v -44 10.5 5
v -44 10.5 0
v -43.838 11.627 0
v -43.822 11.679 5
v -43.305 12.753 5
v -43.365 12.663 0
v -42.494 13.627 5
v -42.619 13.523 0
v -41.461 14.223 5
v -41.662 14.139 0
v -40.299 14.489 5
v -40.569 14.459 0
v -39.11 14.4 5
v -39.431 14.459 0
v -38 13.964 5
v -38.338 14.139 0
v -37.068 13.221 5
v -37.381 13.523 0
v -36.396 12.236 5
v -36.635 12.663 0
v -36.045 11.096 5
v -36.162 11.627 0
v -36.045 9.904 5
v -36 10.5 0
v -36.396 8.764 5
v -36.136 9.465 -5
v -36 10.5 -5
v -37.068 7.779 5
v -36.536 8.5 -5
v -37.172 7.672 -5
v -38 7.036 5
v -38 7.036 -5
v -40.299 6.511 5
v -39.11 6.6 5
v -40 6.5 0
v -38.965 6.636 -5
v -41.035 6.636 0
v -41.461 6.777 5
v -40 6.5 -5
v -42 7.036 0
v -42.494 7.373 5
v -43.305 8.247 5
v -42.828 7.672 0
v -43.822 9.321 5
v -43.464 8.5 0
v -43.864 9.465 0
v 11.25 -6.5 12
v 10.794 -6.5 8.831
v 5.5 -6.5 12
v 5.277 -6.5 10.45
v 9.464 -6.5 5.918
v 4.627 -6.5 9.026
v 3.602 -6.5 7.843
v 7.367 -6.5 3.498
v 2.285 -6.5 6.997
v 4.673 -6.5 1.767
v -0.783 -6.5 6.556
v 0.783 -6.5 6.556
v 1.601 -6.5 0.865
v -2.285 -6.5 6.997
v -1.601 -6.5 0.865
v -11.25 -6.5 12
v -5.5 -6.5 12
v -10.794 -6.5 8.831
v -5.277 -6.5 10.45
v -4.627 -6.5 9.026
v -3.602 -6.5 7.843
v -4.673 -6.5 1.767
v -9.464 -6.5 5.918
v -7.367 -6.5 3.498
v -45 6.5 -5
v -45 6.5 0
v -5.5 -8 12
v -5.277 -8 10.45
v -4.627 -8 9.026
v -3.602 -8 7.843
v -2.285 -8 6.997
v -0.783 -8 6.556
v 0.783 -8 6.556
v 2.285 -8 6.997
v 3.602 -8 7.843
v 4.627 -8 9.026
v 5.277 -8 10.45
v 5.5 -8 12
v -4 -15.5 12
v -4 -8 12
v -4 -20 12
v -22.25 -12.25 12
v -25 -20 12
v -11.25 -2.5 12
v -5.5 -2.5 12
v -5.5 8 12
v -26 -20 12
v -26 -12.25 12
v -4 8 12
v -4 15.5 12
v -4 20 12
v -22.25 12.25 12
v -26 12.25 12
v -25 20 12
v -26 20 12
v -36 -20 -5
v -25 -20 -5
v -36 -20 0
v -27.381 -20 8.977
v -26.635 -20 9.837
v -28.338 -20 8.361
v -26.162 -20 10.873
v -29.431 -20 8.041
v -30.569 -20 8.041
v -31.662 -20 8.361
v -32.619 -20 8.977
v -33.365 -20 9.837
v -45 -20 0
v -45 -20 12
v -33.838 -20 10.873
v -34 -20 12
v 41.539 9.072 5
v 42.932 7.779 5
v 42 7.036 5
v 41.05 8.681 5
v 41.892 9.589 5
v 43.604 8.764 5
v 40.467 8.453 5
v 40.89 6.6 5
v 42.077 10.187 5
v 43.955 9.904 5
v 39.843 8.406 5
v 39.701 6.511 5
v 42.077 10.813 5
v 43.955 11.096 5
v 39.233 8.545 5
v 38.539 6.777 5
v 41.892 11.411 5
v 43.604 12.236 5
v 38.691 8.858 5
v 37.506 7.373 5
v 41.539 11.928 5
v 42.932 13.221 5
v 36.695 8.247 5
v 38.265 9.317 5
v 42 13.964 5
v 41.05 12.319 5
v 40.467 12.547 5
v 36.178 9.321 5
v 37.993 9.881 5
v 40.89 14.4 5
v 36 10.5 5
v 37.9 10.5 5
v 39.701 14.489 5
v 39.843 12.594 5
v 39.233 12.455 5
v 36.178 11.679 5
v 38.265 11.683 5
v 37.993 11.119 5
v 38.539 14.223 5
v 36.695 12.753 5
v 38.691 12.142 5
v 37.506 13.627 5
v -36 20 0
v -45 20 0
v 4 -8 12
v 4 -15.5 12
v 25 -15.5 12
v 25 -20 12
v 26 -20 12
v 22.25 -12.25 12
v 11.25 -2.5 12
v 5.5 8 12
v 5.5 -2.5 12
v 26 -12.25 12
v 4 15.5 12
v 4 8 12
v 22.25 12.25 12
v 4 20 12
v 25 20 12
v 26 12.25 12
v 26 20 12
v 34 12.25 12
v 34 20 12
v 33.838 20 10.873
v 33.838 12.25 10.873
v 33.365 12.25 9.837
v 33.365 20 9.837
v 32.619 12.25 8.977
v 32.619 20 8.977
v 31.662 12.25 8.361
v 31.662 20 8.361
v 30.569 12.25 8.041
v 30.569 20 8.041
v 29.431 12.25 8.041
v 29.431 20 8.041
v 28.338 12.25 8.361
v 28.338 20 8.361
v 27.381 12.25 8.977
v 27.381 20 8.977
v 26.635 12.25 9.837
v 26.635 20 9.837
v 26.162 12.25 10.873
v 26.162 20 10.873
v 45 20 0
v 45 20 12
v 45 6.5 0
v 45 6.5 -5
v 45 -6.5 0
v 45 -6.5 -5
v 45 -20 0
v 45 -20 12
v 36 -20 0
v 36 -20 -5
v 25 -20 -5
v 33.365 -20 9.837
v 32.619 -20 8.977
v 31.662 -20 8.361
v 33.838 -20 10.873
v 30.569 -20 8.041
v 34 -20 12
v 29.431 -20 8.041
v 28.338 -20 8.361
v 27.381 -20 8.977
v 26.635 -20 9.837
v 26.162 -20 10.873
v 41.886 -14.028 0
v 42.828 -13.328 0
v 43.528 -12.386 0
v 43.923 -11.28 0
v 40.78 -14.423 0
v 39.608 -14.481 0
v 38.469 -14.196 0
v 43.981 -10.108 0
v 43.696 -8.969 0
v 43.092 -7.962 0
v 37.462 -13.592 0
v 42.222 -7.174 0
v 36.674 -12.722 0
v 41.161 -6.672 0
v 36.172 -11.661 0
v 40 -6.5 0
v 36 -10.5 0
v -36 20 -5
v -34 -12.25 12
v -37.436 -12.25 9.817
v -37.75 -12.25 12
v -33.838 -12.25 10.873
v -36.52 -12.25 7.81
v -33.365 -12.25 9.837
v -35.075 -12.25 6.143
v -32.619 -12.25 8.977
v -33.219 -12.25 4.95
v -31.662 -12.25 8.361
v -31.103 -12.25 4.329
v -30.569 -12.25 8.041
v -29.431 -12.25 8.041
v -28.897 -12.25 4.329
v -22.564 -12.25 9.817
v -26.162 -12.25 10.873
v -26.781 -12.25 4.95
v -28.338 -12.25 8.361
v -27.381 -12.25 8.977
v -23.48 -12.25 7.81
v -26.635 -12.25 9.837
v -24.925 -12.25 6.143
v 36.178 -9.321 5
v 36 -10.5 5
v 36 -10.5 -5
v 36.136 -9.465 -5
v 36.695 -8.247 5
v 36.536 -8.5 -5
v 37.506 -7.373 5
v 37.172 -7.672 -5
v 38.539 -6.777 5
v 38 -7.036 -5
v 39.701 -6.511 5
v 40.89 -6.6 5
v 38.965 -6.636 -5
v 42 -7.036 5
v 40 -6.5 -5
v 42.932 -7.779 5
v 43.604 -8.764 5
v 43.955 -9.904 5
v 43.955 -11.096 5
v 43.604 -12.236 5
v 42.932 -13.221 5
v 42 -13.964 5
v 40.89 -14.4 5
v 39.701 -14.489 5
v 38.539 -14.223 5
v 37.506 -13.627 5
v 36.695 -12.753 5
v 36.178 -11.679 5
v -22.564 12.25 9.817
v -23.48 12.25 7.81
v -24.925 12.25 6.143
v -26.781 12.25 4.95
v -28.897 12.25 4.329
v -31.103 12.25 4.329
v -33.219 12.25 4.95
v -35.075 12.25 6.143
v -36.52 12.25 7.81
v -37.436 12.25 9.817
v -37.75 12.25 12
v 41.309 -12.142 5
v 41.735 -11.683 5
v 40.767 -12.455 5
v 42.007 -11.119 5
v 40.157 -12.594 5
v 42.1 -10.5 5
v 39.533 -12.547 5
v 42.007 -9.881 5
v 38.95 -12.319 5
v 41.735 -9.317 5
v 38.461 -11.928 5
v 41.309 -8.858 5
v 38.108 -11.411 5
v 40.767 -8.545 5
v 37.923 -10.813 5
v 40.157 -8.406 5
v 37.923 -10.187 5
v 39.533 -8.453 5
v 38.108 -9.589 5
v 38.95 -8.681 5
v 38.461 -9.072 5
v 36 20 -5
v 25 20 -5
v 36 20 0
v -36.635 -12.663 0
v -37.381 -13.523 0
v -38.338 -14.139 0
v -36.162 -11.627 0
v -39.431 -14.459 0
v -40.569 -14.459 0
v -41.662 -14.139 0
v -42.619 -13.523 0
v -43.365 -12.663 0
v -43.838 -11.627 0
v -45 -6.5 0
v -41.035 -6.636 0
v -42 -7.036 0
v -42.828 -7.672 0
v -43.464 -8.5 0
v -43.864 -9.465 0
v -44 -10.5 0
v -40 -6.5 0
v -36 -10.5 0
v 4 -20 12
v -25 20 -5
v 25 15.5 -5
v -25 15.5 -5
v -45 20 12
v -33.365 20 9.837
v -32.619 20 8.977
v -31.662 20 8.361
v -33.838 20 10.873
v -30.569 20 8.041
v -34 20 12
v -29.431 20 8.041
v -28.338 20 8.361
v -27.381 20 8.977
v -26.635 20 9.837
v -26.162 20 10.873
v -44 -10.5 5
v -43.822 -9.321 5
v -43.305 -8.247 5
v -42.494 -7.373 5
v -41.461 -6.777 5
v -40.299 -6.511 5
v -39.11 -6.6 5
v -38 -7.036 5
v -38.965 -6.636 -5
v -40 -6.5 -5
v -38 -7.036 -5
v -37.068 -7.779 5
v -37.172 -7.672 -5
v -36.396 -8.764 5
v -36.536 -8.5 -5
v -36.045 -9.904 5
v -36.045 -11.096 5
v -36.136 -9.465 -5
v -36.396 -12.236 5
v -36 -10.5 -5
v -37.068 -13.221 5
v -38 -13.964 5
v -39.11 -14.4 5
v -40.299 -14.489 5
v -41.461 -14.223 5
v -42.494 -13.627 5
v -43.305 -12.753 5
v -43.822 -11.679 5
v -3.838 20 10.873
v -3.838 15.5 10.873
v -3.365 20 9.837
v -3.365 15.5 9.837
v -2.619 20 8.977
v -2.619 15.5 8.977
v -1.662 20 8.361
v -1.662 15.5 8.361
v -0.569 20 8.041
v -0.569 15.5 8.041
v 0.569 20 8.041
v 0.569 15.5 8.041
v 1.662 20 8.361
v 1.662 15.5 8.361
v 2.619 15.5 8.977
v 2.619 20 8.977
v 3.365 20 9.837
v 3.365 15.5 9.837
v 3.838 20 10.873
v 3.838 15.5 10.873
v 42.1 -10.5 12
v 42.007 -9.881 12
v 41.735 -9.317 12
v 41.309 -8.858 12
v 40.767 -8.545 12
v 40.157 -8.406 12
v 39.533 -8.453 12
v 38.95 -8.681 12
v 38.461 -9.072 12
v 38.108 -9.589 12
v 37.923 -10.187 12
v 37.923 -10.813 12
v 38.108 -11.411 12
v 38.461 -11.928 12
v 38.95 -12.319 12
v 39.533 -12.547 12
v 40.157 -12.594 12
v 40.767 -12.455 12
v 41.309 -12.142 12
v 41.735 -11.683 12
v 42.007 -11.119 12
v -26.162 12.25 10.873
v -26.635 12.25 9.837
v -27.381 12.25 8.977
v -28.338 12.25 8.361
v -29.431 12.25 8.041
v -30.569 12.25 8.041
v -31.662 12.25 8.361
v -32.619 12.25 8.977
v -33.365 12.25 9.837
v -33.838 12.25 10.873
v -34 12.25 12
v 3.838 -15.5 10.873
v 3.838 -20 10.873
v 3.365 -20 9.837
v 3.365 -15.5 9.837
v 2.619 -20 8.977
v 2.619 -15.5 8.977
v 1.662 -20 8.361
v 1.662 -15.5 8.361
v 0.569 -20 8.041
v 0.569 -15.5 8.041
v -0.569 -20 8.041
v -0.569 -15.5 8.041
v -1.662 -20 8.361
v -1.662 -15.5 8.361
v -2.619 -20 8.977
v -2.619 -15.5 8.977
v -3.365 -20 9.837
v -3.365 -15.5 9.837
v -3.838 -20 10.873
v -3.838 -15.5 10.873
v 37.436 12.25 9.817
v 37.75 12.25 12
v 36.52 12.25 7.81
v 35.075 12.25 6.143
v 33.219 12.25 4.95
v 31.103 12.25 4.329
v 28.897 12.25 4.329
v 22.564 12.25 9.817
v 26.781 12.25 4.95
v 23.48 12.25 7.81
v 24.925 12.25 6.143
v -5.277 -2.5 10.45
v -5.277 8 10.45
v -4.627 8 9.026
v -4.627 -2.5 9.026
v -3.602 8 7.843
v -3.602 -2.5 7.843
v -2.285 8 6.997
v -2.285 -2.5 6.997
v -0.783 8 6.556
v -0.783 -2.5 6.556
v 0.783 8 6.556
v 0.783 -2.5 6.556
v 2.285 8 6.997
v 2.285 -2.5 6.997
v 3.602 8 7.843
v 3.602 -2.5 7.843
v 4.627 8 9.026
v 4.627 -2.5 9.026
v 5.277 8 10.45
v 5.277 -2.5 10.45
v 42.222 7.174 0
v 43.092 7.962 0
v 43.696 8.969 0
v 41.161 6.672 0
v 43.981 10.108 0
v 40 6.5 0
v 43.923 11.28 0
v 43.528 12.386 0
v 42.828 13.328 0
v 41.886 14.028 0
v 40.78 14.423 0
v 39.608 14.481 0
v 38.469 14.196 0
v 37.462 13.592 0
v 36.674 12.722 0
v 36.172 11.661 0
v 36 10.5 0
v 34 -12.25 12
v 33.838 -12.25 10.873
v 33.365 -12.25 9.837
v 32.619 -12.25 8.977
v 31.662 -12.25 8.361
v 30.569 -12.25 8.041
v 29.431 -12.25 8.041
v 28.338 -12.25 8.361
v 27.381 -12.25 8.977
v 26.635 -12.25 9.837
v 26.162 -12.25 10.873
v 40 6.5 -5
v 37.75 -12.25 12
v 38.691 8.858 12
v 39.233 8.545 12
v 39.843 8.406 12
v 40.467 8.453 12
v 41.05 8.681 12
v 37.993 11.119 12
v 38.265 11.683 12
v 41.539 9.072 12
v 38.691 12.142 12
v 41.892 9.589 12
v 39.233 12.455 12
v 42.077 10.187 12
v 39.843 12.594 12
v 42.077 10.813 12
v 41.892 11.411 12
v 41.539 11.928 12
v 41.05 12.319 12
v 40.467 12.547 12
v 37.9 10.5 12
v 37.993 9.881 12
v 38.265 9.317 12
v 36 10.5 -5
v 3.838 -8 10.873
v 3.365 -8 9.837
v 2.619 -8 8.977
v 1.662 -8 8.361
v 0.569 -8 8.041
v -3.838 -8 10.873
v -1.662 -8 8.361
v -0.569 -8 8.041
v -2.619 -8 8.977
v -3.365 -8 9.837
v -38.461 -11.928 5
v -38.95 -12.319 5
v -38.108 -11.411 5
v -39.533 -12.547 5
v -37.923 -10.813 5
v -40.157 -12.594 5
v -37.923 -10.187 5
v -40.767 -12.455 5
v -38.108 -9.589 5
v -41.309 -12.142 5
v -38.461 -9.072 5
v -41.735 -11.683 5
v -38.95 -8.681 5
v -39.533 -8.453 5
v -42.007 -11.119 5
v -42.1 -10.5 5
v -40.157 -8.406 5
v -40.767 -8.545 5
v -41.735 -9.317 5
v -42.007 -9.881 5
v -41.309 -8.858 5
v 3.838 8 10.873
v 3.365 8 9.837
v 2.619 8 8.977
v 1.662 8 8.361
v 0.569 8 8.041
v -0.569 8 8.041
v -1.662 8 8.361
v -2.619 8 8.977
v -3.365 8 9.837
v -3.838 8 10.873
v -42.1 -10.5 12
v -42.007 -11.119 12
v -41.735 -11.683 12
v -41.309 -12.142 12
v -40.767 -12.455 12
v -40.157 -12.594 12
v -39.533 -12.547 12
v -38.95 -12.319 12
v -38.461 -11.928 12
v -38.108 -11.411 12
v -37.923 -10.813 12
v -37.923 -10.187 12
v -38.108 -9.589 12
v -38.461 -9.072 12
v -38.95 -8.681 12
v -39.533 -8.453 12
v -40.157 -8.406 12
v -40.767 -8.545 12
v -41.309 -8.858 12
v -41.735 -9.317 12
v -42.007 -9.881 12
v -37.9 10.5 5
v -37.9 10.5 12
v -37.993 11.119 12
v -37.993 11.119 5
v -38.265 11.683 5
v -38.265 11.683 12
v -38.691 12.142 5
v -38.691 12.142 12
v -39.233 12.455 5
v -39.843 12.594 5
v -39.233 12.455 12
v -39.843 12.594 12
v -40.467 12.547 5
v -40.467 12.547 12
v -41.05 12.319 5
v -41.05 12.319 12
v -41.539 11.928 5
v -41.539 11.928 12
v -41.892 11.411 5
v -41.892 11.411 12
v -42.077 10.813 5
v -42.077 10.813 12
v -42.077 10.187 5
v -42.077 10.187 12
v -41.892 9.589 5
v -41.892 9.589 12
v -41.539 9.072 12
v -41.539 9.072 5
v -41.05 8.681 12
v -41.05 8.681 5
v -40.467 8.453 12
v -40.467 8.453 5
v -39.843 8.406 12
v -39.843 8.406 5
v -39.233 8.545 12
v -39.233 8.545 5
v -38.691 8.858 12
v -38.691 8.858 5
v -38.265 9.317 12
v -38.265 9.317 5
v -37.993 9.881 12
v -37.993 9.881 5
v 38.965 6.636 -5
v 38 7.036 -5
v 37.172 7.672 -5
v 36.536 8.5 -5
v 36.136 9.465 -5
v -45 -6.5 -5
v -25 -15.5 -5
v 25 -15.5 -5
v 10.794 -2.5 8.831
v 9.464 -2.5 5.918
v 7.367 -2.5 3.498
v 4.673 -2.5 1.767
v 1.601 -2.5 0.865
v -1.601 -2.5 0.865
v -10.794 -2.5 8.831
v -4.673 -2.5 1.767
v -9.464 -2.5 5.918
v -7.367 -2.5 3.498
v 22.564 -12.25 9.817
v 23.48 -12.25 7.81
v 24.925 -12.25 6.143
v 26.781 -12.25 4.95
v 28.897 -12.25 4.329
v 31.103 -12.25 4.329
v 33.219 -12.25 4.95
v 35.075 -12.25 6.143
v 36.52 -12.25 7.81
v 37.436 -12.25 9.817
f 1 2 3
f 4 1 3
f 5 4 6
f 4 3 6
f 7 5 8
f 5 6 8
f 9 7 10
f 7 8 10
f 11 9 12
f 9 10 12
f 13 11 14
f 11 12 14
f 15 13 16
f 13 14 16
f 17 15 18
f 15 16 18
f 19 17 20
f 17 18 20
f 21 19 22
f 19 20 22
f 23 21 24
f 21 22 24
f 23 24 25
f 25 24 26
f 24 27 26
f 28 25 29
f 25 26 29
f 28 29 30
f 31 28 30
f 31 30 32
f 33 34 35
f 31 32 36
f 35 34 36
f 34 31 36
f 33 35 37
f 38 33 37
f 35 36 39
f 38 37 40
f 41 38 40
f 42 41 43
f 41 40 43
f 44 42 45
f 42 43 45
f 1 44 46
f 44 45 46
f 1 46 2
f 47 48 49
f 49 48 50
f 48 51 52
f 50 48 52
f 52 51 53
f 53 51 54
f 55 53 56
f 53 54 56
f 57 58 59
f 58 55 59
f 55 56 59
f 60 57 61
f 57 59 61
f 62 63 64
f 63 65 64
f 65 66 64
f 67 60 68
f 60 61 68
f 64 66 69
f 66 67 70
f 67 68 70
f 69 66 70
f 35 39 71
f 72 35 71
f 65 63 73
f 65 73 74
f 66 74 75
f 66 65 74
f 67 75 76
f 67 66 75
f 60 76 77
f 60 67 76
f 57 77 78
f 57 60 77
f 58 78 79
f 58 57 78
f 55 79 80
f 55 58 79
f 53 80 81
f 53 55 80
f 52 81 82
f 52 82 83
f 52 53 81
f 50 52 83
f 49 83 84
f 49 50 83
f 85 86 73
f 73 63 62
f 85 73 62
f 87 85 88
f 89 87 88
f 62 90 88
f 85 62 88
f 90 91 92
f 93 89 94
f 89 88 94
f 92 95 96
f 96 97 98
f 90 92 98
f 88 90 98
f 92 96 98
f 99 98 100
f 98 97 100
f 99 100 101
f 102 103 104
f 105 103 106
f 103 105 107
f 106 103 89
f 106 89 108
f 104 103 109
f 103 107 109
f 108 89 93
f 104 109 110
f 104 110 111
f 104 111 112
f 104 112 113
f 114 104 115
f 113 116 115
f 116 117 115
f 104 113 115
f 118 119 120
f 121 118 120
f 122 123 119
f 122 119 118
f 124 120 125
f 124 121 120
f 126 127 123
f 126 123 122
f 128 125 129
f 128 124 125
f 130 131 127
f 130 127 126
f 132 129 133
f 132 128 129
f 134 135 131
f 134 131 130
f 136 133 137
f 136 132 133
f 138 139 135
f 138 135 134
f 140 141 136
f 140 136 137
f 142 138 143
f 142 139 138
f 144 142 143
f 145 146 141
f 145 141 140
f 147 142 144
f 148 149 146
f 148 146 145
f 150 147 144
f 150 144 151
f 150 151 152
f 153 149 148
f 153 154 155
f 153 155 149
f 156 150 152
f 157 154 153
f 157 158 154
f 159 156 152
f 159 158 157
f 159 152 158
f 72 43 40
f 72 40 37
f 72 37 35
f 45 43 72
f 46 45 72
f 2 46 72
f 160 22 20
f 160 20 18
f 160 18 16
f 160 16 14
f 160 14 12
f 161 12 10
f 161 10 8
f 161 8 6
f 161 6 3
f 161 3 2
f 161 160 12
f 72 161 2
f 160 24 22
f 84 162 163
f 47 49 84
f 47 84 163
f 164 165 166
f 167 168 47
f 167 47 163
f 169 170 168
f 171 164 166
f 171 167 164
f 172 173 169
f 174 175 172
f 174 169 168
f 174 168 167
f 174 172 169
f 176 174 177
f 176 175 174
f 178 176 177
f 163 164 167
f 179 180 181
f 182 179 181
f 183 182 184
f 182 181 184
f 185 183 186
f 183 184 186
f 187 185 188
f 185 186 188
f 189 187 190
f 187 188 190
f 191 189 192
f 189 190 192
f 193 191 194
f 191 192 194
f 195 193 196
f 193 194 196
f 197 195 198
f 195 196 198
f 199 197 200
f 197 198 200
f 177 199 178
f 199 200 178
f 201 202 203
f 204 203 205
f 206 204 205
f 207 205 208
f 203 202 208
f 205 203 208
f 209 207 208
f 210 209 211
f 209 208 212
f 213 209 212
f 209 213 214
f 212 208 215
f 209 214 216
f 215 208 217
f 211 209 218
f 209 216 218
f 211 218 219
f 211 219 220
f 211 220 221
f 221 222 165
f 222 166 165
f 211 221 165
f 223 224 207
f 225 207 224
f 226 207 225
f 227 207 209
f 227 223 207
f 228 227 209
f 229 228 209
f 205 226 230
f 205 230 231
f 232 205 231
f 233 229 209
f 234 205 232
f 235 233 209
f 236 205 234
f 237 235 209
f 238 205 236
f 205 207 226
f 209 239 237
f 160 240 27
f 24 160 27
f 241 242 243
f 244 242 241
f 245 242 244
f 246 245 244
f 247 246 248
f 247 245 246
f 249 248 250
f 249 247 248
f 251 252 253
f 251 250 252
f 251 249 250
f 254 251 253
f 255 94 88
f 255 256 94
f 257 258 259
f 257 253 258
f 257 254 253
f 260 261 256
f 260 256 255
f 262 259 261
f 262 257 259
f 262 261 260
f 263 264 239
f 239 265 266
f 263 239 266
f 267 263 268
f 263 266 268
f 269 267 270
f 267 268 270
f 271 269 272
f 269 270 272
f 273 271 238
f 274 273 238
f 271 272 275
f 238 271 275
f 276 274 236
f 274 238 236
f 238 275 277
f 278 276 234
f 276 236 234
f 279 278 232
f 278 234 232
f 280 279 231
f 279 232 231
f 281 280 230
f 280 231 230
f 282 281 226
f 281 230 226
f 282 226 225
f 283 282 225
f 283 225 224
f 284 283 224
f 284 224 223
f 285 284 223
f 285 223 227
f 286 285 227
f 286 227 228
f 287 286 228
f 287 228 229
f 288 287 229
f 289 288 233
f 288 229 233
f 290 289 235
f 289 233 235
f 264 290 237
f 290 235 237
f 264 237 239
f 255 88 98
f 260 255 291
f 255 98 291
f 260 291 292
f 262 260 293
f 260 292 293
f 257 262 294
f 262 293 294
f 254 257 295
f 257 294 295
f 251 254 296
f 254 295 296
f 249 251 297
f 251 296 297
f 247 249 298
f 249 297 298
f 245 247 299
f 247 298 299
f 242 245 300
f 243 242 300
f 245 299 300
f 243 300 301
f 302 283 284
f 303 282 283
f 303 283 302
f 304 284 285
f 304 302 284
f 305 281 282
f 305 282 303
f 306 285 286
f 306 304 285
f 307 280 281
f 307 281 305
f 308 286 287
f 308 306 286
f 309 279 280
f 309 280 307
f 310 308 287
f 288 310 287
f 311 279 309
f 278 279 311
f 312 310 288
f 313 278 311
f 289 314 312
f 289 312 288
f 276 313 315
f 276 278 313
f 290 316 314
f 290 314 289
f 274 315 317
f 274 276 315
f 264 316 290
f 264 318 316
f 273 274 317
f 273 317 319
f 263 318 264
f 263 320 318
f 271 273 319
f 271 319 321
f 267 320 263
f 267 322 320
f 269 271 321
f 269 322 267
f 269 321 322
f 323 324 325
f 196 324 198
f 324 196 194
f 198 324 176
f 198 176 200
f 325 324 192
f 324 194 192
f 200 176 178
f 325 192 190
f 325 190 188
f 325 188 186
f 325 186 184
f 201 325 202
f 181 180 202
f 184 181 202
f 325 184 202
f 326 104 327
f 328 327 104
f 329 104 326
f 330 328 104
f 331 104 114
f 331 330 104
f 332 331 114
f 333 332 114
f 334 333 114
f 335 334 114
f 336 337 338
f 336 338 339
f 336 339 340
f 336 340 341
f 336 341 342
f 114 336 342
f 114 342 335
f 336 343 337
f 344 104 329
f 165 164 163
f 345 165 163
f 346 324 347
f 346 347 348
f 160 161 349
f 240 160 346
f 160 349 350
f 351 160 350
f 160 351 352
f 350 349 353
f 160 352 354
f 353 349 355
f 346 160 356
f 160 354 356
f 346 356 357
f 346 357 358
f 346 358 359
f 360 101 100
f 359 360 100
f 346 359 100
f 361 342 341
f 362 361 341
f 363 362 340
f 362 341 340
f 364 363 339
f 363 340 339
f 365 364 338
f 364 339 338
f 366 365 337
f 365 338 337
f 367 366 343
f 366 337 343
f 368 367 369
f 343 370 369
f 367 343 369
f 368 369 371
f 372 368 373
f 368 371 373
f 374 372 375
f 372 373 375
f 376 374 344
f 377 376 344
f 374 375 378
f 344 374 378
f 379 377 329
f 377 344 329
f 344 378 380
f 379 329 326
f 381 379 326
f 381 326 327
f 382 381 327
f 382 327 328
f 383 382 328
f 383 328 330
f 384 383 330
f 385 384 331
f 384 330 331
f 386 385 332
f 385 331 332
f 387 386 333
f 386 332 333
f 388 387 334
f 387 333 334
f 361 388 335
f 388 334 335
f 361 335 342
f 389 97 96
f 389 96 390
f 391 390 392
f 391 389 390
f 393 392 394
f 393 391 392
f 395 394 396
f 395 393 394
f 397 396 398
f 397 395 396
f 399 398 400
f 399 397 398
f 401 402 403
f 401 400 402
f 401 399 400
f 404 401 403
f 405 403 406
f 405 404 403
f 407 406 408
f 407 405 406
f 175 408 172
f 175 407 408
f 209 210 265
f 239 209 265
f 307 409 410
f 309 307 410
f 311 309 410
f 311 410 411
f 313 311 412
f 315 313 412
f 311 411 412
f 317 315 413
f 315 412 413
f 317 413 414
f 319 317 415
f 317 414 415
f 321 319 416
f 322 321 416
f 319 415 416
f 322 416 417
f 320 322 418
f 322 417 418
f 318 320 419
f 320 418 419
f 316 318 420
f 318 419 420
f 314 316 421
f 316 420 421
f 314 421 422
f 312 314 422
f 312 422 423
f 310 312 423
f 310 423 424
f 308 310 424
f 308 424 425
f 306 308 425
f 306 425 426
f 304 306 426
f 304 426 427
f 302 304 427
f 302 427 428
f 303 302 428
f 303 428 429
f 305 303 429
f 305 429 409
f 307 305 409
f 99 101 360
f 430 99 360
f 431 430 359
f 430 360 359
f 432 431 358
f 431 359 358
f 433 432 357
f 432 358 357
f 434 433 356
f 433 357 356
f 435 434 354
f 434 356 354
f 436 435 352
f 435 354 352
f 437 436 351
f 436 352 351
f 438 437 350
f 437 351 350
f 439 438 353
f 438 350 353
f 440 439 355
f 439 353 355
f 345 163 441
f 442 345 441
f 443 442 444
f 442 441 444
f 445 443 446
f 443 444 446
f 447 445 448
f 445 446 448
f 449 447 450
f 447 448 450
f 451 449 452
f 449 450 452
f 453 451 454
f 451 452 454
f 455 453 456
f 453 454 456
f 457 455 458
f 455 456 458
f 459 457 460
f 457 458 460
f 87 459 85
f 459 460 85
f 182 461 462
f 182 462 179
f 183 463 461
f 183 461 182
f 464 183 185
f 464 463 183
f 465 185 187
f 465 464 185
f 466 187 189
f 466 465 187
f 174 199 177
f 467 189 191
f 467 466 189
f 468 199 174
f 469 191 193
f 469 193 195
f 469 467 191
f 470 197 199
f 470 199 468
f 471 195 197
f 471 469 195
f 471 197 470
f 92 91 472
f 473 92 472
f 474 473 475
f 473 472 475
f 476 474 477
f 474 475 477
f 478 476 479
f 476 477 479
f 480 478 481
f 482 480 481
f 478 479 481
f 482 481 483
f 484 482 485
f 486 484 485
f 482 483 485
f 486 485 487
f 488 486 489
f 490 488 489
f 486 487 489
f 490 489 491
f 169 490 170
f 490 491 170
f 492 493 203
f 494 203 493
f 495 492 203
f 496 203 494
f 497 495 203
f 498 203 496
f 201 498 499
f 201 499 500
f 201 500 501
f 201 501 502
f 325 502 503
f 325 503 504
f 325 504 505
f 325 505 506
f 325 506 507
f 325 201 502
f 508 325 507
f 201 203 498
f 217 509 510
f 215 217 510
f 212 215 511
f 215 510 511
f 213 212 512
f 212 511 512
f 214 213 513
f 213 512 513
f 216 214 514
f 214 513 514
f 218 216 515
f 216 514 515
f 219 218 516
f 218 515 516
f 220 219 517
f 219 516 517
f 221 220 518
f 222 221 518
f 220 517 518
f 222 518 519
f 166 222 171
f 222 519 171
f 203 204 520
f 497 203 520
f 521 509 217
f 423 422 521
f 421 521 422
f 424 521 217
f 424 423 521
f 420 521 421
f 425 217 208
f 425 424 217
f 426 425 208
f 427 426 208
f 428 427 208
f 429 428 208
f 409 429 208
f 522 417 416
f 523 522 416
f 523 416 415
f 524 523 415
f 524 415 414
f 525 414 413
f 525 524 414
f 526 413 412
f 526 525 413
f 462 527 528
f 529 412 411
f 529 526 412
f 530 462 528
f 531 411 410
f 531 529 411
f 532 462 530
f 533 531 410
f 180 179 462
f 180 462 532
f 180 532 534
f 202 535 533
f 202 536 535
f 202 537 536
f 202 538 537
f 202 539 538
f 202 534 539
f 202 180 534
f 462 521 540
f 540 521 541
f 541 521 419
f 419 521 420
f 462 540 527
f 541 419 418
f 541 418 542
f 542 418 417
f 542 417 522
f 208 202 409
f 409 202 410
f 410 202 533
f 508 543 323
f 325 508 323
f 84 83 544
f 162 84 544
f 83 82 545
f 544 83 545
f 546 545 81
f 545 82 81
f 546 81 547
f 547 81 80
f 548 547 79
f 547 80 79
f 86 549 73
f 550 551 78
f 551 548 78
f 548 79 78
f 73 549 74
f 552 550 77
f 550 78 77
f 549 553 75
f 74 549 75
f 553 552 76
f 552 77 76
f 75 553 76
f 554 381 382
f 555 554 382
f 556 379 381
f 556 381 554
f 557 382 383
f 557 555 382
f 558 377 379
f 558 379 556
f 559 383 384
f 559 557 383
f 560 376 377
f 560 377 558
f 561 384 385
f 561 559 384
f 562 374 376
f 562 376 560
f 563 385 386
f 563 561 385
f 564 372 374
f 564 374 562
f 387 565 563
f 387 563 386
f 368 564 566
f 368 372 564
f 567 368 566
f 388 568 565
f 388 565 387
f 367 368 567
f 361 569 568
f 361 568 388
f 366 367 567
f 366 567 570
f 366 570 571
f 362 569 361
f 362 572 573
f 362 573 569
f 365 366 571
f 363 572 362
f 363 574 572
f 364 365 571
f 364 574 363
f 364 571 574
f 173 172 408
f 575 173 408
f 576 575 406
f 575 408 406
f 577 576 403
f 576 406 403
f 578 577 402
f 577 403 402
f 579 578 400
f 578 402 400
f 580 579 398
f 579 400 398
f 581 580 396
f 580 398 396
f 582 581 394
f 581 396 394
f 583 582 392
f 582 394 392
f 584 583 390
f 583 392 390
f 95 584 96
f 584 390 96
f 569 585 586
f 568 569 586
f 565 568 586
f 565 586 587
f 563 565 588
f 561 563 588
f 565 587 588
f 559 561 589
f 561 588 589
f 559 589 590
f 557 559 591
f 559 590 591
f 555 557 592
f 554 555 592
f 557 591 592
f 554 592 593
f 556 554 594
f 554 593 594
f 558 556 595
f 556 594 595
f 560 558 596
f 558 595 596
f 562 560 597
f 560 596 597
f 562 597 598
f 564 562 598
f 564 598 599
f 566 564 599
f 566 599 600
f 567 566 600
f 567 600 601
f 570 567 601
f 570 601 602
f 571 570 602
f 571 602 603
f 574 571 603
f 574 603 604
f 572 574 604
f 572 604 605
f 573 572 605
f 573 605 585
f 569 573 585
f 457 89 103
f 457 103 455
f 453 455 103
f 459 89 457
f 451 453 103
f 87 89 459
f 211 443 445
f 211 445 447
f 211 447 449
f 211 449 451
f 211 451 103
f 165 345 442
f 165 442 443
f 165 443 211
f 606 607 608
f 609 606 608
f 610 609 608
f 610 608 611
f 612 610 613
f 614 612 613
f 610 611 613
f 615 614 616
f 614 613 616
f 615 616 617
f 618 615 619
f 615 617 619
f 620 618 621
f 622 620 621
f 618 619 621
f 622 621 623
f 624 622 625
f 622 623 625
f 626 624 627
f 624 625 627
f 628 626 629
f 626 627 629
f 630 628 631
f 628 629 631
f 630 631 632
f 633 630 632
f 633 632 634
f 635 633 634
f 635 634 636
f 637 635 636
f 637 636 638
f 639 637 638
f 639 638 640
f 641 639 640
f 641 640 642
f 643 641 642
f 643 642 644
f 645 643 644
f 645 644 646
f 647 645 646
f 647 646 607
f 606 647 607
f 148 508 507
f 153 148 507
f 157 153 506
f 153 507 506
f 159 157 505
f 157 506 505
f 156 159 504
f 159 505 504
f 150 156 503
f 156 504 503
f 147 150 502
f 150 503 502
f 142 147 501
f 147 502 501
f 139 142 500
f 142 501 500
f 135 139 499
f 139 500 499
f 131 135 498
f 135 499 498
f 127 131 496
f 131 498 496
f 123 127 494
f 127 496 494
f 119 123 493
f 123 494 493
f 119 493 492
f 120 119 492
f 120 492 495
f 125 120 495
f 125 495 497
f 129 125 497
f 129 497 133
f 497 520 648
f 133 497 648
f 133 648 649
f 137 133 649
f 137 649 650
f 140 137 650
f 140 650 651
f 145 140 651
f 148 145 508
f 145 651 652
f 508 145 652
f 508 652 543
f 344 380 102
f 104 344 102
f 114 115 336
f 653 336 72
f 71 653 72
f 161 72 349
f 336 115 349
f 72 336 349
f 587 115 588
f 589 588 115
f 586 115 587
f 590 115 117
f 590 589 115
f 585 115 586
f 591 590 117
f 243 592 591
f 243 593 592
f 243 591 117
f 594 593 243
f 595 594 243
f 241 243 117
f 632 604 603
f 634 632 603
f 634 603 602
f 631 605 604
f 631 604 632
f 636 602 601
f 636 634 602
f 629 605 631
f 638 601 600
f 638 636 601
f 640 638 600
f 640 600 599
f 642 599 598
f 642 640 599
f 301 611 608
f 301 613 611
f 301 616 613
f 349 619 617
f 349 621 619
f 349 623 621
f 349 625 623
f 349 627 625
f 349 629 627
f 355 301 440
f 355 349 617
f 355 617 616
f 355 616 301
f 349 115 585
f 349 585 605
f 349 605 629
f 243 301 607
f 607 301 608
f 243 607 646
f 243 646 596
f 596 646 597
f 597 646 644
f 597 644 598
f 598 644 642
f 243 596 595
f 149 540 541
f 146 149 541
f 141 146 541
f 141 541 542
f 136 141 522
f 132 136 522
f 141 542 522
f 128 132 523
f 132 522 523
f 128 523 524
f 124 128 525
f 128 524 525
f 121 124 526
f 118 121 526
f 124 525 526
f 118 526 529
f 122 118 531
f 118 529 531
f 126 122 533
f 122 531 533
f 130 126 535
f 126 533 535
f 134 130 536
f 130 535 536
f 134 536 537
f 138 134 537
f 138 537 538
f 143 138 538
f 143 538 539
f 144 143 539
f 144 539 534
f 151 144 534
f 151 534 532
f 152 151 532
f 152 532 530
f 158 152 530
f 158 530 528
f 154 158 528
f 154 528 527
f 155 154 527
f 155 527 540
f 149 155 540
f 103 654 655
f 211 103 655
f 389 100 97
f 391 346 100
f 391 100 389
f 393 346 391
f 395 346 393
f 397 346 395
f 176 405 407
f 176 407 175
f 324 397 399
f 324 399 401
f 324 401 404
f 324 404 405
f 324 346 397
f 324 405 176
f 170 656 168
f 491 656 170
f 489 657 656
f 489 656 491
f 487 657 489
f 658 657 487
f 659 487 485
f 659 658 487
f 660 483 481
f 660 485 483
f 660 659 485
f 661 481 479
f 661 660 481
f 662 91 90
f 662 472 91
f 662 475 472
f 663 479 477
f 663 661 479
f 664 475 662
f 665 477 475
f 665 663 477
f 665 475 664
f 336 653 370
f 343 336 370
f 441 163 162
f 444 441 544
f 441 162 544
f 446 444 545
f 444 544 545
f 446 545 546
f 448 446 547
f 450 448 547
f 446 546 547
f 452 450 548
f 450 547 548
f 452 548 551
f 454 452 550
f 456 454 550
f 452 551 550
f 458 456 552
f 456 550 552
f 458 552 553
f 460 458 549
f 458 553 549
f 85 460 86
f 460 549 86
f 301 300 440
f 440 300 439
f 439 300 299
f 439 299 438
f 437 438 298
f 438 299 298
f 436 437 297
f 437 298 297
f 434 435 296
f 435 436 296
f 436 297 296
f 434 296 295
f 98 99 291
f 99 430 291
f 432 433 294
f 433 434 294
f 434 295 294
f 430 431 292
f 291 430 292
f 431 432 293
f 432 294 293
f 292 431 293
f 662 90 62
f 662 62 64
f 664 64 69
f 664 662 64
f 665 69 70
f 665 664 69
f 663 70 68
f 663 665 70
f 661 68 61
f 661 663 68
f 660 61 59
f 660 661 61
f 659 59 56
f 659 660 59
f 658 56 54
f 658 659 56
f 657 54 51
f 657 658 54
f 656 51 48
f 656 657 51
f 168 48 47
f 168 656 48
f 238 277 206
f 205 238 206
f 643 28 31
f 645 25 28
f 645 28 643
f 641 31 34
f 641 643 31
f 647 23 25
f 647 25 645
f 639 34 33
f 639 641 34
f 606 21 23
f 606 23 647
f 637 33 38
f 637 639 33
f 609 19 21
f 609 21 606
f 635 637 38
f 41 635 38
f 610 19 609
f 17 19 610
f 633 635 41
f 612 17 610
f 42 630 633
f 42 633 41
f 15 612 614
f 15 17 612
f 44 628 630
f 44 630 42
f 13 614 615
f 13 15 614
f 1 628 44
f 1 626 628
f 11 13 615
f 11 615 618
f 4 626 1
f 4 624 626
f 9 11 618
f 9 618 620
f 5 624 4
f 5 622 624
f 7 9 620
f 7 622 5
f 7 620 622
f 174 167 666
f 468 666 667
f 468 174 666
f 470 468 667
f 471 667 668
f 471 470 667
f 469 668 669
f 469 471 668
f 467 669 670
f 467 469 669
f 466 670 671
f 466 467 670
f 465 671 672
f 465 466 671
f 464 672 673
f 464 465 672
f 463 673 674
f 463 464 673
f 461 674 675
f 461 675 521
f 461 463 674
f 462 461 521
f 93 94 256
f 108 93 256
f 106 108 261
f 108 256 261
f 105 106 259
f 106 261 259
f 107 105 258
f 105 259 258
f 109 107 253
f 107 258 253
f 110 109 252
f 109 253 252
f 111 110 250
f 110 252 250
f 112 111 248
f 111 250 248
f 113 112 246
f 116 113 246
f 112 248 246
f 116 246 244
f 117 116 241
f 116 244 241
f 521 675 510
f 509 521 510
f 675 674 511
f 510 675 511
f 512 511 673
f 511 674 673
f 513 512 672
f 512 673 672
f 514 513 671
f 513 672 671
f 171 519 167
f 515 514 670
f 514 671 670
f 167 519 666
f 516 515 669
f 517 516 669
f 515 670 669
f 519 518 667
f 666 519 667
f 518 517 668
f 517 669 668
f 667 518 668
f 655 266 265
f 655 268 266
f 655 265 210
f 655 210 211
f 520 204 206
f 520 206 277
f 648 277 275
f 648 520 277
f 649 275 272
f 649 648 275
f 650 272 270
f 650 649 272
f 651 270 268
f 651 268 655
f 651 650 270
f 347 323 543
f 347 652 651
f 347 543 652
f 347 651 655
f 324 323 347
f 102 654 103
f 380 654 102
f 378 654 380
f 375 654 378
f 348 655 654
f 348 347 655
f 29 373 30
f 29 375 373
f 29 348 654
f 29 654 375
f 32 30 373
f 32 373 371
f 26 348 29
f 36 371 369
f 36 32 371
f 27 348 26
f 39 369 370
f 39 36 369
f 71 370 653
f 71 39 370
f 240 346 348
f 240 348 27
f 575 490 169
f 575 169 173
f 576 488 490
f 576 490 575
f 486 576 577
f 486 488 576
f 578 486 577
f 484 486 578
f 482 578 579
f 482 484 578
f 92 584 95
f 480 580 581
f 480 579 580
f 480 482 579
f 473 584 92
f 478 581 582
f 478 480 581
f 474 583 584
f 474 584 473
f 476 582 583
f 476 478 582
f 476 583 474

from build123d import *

# Parameters (mm, degrees)
ESQUISSE1_W             = 90
ESQUISSE1_H             = 40
BOSS_EXTRU_1_DEPTH      = 12
ESQUISSE2_R             = 4
ENL_V_MAT_EXTRU_1_DEPTH = 62.392181913
ESQUISSE3_R             = 7.75
ENL_V_MAT_EXTRU_2_DEPTH = 12.25
ESQUISSE9_W             = 50
ESQUISSE9_H             = 14.72812859
ESQUISSE9_H_2           = 10.600161614
ENL_V_MAT_EXTRU_7_DEPTH = 31
BOSS_EXTRUDE1_DEPTH     = 5
SKETCH2_R               = 2.1
CUT_EXTRUDE1_DEPTH      = 53.096065111
SKETCH3_R               = 4
CUT_EXTRUDE2_DEPTH      = 10
CUT_EXTRUDE3_DEPTH      = 5
SKETCH6_W               = 4
SKETCH6_H               = 31
BOSS_EXTRUDE2_START     = 4.5
BOSS_EXTRUDE2_DEPTH     = 4.5
BOSS_EXTRUDE3_DEPTH     = 4.5


with BuildPart() as part:
    # Esquisse1 → Boss.-Extru.1 (new body)
    with BuildSketch(Plane.XY):
        Rectangle(ESQUISSE1_W, ESQUISSE1_H)
    extrude(amount=BOSS_EXTRU_1_DEPTH)

    # Esquisse2 → Enlèv. mat.-Extru.1 (cut, through all)
    with BuildSketch(Plane(origin=(0, 20, 0), x_dir=(1, 0, 0), z_dir=(0, 1, 0))):
        with Locations((-30, -12)):
            Circle(ESQUISSE2_R)
        with Locations((30, -12)):
            Circle(ESQUISSE2_R)
    extrude(amount=-ENL_V_MAT_EXTRU_1_DEPTH, mode=Mode.SUBTRACT)

    # Esquisse3 → Enlèv. mat.-Extru.2 (cut, symmetric)
    with BuildSketch(Plane(origin=(0, 0, 0), x_dir=(1, 0, 0), z_dir=(0, 1, 0))):
        with Locations((-30, -12)):
            Circle(ESQUISSE3_R)
    enl_v_mat_extru_2 = extrude(amount=ENL_V_MAT_EXTRU_2_DEPTH, both=True, mode=Mode.SUBTRACT)

    # Esquisse9 → Enlèv. mat.-Extru.7 (cut)
    with BuildSketch(Plane.XY.offset(12)):
        with Locations((0, -22.864064295)):
            Rectangle(ESQUISSE9_W, ESQUISSE9_H)
        with Locations((0, 20.800080807)):
            Rectangle(ESQUISSE9_W, ESQUISSE9_H_2)
    extrude(amount=-ENL_V_MAT_EXTRU_7_DEPTH, mode=Mode.SUBTRACT)

    # Sketch1 → Boss-Extrude1 (add)
    with BuildSketch(Plane(origin=(0, 0, 0), x_dir=(-1, 0, 0), z_dir=(0, 0, -1))):
        Polygon((-25, -15.5), (25, -15.5), (25, -20), (45, -20), (45, 20), (25, 20), (25, 15.5), (-25, 15.5), (-25, 20), (-45, 20), (-45, -20), (-25, -20), align=None)
    extrude(amount=BOSS_EXTRUDE1_DEPTH)

    # Sketch2 → Cut-Extrude1 (cut, through all)
    with BuildSketch(Plane.XY.offset(12)):
        with Locations((-40, 10.5)):
            Circle(SKETCH2_R)
        with Locations((40, 10.5)):
            Circle(SKETCH2_R)
        with Locations((40, -10.5)):
            Circle(SKETCH2_R)
        with Locations((-40, -10.5)):
            Circle(SKETCH2_R)
    extrude(amount=-CUT_EXTRUDE1_DEPTH, mode=Mode.SUBTRACT)

    # Sketch3 → Cut-Extrude2 (cut)
    with BuildSketch(Plane(origin=(0, 0, -5), x_dir=(-1, 0, 0), z_dir=(0, 0, -1))):
        with Locations((-40, 10.5)):
            Circle(SKETCH3_R)
        with Locations((40, 10.5)):
            Circle(SKETCH3_R)
        with Locations((40, -10.5)):
            Circle(SKETCH3_R)
        with Locations((-40, -10.5)):
            Circle(SKETCH3_R)
    extrude(amount=-CUT_EXTRUDE2_DEPTH, mode=Mode.SUBTRACT)

    # Sketch4 → Cut-Extrude3 (cut)
    with BuildSketch(Plane(origin=(0, 0, -5), x_dir=(-1, 0, 0), z_dir=(0, 0, -1))):
        with BuildLine():
            Line((-36, 10.5), (-36, 20))
            Line((-36, 20), (-45, 20))
            Line((-45, 20), (-45, 6.5))
            Line((-45, 6.5), (-40, 6.5))
            ThreePointArc((-40, 6.5), (-42.828427125, 13.328427125), (-36, 10.5))
        make_face()
        with BuildLine():
            Line((-40, -6.5), (-50, -6.5))
            Line((-50, -6.5), (-45, -20))
            Line((-45, -20), (-36, -20))
            Line((-36, -20), (-36, -10.5))
            ThreePointArc((-36, -10.5), (-42.828427125, -13.328427125), (-40, -6.5))
        make_face()
        with BuildLine():
            Line((45, -20), (45, -6.5))
            Line((45, -6.5), (40, -6.5))
            ThreePointArc((40, -6.5), (42.828427125, -13.328427125), (36, -10.5))
            Line((36, -10.5), (36, -20))
            Line((36, -20), (45, -20))
        make_face()
        with BuildLine():
            Line((40, 6.5), (45, 6.5))
            Line((45, 6.5), (45, 20))
            Line((45, 20), (36, 20))
            Line((36, 20), (36, 10.5))
            ThreePointArc((36, 10.5), (42.828427125, 13.328427125), (40, 6.5))
        make_face()
    extrude(amount=-CUT_EXTRUDE3_DEPTH, mode=Mode.SUBTRACT)

    # Mirror1: Enlèv. mat.-Extru.2 across plane
    add(enl_v_mat_extru_2.mirror(Plane.ZY), mode=Mode.SUBTRACT)

    # Sketch6 → Cut-Revolve1 (revolve, cut)
    with BuildSketch(Plane.XY.offset(12)):
        with Locations((-2, 0)):
            Rectangle(SKETCH6_W, SKETCH6_H)
    revolve(axis=Axis((0, -15.5, 12), (0, 1, 0)), mode=Mode.SUBTRACT)

    # Sketch7 → Cut-Revolve4 (revolve, cut)
    with BuildSketch(Plane.XY.offset(12)):
        Polygon((-11.25, -2.5), (-11.25, -6.5), (-5.5, -6.5), (-5.5, -8), (-4, -8), (-4, 8), (-5.5, 8), (-5.5, -2.5), align=None)
    revolve(axis=Axis((0, 8, 12), (0, -1, 0)), mode=Mode.SUBTRACT)

    # Sketch8 → Boss-Extrude2 (add)
    with BuildSketch(Plane(origin=(0, 15.5, 0), x_dir=(1, 0, 0), z_dir=(0, 1, 0)).offset(BOSS_EXTRUDE2_START)):
        with BuildLine():
            Line((4, -12), (25, -12))
            Line((25, -12), (25, 5))
            Line((25, 5), (-25, 5))
            Line((-25, 5), (-25, -12))
            Line((-25, -12), (-4, -12))
            ThreePointArc((-4, -12), (0, -8), (4, -12))
        make_face()
    extrude(amount=-BOSS_EXTRUDE2_DEPTH)

    # Sketch9 → Boss-Extrude3 (add)
    with BuildSketch(Plane.XZ.offset(15.5)):
        with BuildLine():
            Line((-4, 12), (-25, 12))
            Line((-25, 12), (-25, -5))
            Line((-25, -5), (25, -5))
            Line((25, -5), (25, 12))
            Line((25, 12), (4, 12))
            ThreePointArc((4, 12), (0, 8), (-4, 12))
        make_face()
    extrude(amount=BOSS_EXTRUDE3_DEPTH)


solid = part.part
